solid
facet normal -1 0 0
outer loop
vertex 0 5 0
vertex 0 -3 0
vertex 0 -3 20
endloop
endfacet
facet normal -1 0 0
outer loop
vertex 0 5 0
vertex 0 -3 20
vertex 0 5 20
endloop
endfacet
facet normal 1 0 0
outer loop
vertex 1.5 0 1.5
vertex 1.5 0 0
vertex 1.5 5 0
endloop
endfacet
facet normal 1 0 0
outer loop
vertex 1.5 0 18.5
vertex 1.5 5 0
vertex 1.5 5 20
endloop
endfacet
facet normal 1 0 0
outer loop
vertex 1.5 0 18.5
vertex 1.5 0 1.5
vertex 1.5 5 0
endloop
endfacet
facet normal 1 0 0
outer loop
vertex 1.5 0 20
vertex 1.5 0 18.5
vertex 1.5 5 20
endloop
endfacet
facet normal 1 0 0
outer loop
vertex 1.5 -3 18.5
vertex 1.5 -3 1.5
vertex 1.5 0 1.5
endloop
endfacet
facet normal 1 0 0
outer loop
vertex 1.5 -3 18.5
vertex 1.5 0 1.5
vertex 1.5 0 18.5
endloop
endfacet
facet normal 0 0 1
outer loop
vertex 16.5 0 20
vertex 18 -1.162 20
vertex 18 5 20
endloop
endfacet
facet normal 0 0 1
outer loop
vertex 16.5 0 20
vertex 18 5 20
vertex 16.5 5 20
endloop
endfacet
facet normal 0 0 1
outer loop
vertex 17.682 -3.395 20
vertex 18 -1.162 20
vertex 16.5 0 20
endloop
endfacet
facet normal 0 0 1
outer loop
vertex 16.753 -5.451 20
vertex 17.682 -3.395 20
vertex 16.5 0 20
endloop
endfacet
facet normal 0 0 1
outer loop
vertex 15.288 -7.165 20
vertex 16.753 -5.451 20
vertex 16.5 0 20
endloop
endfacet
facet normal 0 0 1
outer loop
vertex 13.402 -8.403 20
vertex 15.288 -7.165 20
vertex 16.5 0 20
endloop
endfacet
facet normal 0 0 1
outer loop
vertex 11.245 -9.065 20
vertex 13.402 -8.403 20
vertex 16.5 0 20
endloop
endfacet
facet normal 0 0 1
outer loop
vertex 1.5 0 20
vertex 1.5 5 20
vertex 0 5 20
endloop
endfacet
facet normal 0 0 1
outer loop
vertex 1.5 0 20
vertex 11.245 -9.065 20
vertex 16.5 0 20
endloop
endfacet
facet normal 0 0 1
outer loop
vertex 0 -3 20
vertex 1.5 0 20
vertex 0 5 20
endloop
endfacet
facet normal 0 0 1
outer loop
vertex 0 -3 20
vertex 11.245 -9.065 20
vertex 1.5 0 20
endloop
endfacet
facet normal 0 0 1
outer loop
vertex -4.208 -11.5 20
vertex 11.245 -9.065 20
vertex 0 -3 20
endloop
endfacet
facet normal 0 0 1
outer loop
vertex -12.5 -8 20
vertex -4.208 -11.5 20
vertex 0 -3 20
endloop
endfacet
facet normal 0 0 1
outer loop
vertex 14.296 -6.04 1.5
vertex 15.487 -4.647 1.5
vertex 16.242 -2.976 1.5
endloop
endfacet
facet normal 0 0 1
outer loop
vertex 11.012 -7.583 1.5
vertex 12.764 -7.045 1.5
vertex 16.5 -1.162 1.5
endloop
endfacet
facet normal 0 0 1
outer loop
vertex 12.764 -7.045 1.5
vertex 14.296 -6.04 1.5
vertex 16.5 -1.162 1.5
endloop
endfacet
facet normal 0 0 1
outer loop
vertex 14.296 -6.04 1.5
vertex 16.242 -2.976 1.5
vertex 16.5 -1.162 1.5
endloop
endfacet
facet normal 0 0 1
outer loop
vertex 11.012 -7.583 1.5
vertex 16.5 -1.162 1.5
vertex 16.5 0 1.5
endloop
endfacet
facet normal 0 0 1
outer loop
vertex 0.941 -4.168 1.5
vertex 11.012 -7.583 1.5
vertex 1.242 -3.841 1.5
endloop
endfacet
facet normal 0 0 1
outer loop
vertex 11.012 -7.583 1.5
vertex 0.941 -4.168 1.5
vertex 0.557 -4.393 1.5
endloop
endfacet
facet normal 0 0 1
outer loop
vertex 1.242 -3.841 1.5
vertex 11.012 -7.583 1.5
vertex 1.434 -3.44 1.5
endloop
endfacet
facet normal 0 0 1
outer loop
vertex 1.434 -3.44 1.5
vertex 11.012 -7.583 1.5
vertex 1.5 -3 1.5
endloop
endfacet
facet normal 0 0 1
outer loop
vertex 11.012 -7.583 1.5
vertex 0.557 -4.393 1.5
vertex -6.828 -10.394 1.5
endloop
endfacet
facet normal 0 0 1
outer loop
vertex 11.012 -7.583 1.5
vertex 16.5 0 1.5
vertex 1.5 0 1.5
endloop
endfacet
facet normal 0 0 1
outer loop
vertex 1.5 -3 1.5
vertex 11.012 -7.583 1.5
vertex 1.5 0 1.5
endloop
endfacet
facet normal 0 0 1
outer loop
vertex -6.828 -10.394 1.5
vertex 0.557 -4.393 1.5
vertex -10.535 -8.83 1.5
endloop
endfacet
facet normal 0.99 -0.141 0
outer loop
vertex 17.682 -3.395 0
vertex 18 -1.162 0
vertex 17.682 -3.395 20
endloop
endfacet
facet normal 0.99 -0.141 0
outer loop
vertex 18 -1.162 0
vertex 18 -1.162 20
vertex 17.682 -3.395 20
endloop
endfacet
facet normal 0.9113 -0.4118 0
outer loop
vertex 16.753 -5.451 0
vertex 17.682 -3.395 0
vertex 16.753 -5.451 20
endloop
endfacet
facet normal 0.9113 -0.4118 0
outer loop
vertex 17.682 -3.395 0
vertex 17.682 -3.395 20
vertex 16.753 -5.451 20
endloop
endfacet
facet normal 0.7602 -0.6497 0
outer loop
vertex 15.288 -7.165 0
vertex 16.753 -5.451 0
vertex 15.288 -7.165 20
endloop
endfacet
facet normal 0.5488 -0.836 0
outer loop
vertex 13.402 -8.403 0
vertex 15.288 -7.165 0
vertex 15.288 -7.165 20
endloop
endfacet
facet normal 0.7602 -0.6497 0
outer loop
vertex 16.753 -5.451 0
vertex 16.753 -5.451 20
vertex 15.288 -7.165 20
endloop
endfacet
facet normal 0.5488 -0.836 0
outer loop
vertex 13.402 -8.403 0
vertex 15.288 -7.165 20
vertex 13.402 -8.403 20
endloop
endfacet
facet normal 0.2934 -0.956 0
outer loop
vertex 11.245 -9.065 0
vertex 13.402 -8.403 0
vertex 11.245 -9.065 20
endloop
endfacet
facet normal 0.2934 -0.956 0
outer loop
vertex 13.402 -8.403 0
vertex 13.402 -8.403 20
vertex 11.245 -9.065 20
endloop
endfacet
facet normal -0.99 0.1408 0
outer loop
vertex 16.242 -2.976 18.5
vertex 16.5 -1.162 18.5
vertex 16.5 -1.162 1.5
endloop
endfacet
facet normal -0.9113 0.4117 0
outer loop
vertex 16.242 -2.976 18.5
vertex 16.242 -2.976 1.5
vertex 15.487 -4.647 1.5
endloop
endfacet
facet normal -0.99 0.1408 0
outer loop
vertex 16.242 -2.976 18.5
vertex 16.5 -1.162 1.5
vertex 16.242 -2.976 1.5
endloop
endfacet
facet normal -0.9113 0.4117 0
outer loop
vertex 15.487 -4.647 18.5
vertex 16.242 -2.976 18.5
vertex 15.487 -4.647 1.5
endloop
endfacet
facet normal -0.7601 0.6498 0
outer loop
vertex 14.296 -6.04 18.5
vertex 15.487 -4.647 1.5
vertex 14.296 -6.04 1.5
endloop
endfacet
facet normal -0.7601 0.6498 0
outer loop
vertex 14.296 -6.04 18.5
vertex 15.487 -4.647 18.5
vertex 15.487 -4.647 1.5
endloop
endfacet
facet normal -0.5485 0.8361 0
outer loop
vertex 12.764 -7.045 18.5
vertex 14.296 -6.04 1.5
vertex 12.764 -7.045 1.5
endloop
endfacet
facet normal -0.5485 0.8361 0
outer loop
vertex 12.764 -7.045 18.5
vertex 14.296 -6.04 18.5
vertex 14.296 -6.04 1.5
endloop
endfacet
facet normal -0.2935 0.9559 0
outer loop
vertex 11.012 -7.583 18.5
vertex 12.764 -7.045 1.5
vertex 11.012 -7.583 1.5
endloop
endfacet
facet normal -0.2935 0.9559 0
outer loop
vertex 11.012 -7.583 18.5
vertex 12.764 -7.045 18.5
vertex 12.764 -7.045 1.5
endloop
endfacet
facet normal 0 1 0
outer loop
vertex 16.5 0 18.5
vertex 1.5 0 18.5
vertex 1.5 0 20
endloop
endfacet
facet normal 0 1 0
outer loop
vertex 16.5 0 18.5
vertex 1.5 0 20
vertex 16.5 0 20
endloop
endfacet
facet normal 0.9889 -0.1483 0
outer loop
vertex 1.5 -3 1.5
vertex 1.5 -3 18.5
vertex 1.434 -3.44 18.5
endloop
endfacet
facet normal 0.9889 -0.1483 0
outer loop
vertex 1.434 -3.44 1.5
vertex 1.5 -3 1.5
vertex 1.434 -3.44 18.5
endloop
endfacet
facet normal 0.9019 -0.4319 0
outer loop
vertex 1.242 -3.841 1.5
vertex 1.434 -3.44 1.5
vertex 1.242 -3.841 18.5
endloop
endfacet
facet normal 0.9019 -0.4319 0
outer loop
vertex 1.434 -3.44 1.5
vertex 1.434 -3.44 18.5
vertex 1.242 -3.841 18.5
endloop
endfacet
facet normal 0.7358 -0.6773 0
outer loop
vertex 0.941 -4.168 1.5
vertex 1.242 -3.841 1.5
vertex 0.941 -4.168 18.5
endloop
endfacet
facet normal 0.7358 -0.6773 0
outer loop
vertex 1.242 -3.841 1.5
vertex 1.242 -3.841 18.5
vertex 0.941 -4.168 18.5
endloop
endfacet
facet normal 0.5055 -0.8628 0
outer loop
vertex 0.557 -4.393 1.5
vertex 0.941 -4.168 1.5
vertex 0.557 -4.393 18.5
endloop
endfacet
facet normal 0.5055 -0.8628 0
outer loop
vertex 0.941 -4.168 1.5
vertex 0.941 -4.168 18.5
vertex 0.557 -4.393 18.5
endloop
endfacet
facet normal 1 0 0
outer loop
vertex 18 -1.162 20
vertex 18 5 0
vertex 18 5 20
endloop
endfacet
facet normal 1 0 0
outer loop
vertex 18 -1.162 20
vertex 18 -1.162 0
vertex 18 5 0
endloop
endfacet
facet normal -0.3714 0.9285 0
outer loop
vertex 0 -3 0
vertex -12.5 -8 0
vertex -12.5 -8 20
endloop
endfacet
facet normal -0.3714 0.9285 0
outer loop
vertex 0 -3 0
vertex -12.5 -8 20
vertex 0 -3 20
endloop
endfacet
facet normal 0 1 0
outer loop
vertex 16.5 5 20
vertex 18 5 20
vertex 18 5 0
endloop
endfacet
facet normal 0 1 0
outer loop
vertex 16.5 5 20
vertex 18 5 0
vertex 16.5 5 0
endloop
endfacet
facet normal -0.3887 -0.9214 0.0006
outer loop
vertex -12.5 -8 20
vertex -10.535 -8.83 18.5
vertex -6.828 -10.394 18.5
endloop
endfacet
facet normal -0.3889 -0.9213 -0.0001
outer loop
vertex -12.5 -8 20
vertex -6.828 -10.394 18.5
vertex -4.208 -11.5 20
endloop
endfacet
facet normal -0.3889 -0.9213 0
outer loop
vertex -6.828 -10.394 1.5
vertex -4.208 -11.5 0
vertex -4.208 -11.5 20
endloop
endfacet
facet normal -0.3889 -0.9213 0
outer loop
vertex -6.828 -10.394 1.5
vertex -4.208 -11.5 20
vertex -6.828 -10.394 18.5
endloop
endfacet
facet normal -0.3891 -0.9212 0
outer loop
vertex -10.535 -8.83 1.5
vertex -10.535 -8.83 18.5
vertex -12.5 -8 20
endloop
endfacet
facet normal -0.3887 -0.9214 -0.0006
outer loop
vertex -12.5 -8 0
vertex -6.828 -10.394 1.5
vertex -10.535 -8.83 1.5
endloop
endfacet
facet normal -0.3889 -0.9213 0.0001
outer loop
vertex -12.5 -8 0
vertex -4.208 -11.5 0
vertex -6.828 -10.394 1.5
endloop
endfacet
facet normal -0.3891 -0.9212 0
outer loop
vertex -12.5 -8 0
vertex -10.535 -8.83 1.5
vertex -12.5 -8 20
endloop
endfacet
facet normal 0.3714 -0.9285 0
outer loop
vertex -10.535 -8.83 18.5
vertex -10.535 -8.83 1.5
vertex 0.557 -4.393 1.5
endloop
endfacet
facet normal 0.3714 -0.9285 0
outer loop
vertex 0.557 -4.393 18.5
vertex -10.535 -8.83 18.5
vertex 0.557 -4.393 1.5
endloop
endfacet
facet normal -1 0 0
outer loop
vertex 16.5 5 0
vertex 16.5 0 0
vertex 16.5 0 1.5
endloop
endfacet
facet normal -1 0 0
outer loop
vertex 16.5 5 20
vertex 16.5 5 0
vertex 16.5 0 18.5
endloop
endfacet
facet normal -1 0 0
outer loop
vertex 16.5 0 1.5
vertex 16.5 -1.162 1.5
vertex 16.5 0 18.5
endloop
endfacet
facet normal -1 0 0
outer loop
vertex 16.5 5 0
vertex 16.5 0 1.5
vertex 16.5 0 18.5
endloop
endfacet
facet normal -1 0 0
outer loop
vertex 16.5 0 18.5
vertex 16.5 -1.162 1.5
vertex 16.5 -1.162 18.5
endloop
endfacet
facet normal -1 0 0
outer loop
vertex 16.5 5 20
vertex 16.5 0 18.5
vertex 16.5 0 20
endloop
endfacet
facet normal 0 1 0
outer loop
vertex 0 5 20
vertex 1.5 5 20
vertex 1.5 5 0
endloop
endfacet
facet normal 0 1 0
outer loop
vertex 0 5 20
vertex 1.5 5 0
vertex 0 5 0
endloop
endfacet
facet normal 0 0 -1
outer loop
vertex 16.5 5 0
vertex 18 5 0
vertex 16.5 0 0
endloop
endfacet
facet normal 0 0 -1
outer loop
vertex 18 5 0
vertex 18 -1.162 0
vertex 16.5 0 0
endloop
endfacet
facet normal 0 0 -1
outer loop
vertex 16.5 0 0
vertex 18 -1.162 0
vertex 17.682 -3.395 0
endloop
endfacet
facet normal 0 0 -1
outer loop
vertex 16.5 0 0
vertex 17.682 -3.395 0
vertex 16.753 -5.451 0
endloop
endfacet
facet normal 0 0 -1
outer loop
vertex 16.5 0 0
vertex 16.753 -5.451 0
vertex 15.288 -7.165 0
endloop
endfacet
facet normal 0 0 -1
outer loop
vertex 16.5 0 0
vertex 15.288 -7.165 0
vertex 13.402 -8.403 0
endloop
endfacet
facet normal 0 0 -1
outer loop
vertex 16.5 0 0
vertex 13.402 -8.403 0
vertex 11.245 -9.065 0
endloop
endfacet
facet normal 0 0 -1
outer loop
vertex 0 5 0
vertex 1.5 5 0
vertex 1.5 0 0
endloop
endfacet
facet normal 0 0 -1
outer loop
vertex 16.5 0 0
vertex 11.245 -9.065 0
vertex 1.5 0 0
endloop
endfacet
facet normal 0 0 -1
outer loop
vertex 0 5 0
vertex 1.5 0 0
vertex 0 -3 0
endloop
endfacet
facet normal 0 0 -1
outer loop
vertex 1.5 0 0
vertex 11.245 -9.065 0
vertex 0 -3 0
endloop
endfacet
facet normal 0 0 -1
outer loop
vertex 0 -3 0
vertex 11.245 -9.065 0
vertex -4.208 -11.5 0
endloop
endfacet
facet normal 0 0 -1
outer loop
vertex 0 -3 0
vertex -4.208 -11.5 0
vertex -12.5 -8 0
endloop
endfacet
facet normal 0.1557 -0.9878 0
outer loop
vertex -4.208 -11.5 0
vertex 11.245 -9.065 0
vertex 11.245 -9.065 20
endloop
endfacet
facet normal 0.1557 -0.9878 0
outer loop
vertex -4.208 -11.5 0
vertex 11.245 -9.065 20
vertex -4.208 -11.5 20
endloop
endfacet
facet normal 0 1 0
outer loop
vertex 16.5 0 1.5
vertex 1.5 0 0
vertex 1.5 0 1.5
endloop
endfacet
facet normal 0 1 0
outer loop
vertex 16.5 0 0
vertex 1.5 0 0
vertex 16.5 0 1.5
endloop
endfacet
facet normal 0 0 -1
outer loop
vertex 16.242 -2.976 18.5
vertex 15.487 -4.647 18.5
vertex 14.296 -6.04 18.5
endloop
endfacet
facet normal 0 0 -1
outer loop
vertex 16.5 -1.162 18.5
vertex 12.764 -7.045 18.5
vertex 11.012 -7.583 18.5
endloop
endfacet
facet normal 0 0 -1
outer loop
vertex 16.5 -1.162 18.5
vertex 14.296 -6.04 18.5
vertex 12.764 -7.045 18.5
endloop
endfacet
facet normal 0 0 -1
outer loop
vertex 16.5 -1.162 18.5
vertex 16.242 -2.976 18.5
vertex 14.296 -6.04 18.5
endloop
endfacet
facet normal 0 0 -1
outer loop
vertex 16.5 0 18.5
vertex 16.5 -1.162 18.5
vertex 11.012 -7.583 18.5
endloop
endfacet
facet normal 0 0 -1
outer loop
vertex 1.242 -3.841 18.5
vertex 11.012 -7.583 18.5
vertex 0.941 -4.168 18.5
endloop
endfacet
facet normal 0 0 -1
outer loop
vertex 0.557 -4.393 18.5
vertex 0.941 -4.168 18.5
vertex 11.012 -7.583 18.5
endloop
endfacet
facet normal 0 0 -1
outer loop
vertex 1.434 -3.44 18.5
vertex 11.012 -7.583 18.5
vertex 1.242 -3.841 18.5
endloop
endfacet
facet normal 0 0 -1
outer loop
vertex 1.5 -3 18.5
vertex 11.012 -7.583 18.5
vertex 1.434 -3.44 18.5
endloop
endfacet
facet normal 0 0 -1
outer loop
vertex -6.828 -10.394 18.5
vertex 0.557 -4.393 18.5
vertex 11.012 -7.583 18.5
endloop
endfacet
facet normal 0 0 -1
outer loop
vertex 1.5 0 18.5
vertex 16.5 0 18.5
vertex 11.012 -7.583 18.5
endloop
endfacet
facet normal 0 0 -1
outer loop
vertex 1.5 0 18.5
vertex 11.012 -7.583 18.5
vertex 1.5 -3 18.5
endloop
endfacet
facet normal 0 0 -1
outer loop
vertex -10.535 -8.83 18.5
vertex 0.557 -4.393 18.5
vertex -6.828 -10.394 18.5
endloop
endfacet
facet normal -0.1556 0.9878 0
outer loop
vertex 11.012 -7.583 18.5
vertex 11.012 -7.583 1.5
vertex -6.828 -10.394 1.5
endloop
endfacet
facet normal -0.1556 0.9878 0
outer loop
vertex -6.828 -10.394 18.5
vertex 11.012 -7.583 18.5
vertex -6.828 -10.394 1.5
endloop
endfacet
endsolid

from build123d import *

# Parameters (mm, degrees)
PAD_DEPTH    = 20
FILLET_R     = 8
THICKNESS_T  = -1.5
SKETCH001_W  = 1.5
SKETCH001_H  = 20
PAD001_DEPTH = 5


with BuildPart() as part:
    # Sketch → Pad (new body)
    with BuildSketch(Plane.XY):
        Polygon((0, 0), (18, 0), (18, -8), (-4.208438, -11.5), (-12.5, -8), (0, -3), align=None)
    extrude(amount=PAD_DEPTH)

    # Fillet
    fillet_edges = [part.edges().sort_by_distance(p)[0] for p in [
        (18, -8, 10),
    ]]
    fillet(fillet_edges, radius=FILLET_R)

    # Thickness
    thickness_openings = [part.faces().sort_by_distance(p)[0] for p in [
        (9, 0, 10),
        (-8.354219, -9.75, 10),
    ]]
    offset(amount=THICKNESS_T, openings=thickness_openings)

    # Sketch001 → Pad001 (new body)
    with BuildSketch(Plane(origin=(0, 0, 0), x_dir=(-1, 0, 0), z_dir=(0, 1, 0))):
        with Locations((-17.25, 10)):
            Rectangle(SKETCH001_W, SKETCH001_H)
        with Locations((-0.75, 10)):
            Rectangle(SKETCH001_W, SKETCH001_H)
    extrude(amount=PAD001_DEPTH)


solid = part.part
